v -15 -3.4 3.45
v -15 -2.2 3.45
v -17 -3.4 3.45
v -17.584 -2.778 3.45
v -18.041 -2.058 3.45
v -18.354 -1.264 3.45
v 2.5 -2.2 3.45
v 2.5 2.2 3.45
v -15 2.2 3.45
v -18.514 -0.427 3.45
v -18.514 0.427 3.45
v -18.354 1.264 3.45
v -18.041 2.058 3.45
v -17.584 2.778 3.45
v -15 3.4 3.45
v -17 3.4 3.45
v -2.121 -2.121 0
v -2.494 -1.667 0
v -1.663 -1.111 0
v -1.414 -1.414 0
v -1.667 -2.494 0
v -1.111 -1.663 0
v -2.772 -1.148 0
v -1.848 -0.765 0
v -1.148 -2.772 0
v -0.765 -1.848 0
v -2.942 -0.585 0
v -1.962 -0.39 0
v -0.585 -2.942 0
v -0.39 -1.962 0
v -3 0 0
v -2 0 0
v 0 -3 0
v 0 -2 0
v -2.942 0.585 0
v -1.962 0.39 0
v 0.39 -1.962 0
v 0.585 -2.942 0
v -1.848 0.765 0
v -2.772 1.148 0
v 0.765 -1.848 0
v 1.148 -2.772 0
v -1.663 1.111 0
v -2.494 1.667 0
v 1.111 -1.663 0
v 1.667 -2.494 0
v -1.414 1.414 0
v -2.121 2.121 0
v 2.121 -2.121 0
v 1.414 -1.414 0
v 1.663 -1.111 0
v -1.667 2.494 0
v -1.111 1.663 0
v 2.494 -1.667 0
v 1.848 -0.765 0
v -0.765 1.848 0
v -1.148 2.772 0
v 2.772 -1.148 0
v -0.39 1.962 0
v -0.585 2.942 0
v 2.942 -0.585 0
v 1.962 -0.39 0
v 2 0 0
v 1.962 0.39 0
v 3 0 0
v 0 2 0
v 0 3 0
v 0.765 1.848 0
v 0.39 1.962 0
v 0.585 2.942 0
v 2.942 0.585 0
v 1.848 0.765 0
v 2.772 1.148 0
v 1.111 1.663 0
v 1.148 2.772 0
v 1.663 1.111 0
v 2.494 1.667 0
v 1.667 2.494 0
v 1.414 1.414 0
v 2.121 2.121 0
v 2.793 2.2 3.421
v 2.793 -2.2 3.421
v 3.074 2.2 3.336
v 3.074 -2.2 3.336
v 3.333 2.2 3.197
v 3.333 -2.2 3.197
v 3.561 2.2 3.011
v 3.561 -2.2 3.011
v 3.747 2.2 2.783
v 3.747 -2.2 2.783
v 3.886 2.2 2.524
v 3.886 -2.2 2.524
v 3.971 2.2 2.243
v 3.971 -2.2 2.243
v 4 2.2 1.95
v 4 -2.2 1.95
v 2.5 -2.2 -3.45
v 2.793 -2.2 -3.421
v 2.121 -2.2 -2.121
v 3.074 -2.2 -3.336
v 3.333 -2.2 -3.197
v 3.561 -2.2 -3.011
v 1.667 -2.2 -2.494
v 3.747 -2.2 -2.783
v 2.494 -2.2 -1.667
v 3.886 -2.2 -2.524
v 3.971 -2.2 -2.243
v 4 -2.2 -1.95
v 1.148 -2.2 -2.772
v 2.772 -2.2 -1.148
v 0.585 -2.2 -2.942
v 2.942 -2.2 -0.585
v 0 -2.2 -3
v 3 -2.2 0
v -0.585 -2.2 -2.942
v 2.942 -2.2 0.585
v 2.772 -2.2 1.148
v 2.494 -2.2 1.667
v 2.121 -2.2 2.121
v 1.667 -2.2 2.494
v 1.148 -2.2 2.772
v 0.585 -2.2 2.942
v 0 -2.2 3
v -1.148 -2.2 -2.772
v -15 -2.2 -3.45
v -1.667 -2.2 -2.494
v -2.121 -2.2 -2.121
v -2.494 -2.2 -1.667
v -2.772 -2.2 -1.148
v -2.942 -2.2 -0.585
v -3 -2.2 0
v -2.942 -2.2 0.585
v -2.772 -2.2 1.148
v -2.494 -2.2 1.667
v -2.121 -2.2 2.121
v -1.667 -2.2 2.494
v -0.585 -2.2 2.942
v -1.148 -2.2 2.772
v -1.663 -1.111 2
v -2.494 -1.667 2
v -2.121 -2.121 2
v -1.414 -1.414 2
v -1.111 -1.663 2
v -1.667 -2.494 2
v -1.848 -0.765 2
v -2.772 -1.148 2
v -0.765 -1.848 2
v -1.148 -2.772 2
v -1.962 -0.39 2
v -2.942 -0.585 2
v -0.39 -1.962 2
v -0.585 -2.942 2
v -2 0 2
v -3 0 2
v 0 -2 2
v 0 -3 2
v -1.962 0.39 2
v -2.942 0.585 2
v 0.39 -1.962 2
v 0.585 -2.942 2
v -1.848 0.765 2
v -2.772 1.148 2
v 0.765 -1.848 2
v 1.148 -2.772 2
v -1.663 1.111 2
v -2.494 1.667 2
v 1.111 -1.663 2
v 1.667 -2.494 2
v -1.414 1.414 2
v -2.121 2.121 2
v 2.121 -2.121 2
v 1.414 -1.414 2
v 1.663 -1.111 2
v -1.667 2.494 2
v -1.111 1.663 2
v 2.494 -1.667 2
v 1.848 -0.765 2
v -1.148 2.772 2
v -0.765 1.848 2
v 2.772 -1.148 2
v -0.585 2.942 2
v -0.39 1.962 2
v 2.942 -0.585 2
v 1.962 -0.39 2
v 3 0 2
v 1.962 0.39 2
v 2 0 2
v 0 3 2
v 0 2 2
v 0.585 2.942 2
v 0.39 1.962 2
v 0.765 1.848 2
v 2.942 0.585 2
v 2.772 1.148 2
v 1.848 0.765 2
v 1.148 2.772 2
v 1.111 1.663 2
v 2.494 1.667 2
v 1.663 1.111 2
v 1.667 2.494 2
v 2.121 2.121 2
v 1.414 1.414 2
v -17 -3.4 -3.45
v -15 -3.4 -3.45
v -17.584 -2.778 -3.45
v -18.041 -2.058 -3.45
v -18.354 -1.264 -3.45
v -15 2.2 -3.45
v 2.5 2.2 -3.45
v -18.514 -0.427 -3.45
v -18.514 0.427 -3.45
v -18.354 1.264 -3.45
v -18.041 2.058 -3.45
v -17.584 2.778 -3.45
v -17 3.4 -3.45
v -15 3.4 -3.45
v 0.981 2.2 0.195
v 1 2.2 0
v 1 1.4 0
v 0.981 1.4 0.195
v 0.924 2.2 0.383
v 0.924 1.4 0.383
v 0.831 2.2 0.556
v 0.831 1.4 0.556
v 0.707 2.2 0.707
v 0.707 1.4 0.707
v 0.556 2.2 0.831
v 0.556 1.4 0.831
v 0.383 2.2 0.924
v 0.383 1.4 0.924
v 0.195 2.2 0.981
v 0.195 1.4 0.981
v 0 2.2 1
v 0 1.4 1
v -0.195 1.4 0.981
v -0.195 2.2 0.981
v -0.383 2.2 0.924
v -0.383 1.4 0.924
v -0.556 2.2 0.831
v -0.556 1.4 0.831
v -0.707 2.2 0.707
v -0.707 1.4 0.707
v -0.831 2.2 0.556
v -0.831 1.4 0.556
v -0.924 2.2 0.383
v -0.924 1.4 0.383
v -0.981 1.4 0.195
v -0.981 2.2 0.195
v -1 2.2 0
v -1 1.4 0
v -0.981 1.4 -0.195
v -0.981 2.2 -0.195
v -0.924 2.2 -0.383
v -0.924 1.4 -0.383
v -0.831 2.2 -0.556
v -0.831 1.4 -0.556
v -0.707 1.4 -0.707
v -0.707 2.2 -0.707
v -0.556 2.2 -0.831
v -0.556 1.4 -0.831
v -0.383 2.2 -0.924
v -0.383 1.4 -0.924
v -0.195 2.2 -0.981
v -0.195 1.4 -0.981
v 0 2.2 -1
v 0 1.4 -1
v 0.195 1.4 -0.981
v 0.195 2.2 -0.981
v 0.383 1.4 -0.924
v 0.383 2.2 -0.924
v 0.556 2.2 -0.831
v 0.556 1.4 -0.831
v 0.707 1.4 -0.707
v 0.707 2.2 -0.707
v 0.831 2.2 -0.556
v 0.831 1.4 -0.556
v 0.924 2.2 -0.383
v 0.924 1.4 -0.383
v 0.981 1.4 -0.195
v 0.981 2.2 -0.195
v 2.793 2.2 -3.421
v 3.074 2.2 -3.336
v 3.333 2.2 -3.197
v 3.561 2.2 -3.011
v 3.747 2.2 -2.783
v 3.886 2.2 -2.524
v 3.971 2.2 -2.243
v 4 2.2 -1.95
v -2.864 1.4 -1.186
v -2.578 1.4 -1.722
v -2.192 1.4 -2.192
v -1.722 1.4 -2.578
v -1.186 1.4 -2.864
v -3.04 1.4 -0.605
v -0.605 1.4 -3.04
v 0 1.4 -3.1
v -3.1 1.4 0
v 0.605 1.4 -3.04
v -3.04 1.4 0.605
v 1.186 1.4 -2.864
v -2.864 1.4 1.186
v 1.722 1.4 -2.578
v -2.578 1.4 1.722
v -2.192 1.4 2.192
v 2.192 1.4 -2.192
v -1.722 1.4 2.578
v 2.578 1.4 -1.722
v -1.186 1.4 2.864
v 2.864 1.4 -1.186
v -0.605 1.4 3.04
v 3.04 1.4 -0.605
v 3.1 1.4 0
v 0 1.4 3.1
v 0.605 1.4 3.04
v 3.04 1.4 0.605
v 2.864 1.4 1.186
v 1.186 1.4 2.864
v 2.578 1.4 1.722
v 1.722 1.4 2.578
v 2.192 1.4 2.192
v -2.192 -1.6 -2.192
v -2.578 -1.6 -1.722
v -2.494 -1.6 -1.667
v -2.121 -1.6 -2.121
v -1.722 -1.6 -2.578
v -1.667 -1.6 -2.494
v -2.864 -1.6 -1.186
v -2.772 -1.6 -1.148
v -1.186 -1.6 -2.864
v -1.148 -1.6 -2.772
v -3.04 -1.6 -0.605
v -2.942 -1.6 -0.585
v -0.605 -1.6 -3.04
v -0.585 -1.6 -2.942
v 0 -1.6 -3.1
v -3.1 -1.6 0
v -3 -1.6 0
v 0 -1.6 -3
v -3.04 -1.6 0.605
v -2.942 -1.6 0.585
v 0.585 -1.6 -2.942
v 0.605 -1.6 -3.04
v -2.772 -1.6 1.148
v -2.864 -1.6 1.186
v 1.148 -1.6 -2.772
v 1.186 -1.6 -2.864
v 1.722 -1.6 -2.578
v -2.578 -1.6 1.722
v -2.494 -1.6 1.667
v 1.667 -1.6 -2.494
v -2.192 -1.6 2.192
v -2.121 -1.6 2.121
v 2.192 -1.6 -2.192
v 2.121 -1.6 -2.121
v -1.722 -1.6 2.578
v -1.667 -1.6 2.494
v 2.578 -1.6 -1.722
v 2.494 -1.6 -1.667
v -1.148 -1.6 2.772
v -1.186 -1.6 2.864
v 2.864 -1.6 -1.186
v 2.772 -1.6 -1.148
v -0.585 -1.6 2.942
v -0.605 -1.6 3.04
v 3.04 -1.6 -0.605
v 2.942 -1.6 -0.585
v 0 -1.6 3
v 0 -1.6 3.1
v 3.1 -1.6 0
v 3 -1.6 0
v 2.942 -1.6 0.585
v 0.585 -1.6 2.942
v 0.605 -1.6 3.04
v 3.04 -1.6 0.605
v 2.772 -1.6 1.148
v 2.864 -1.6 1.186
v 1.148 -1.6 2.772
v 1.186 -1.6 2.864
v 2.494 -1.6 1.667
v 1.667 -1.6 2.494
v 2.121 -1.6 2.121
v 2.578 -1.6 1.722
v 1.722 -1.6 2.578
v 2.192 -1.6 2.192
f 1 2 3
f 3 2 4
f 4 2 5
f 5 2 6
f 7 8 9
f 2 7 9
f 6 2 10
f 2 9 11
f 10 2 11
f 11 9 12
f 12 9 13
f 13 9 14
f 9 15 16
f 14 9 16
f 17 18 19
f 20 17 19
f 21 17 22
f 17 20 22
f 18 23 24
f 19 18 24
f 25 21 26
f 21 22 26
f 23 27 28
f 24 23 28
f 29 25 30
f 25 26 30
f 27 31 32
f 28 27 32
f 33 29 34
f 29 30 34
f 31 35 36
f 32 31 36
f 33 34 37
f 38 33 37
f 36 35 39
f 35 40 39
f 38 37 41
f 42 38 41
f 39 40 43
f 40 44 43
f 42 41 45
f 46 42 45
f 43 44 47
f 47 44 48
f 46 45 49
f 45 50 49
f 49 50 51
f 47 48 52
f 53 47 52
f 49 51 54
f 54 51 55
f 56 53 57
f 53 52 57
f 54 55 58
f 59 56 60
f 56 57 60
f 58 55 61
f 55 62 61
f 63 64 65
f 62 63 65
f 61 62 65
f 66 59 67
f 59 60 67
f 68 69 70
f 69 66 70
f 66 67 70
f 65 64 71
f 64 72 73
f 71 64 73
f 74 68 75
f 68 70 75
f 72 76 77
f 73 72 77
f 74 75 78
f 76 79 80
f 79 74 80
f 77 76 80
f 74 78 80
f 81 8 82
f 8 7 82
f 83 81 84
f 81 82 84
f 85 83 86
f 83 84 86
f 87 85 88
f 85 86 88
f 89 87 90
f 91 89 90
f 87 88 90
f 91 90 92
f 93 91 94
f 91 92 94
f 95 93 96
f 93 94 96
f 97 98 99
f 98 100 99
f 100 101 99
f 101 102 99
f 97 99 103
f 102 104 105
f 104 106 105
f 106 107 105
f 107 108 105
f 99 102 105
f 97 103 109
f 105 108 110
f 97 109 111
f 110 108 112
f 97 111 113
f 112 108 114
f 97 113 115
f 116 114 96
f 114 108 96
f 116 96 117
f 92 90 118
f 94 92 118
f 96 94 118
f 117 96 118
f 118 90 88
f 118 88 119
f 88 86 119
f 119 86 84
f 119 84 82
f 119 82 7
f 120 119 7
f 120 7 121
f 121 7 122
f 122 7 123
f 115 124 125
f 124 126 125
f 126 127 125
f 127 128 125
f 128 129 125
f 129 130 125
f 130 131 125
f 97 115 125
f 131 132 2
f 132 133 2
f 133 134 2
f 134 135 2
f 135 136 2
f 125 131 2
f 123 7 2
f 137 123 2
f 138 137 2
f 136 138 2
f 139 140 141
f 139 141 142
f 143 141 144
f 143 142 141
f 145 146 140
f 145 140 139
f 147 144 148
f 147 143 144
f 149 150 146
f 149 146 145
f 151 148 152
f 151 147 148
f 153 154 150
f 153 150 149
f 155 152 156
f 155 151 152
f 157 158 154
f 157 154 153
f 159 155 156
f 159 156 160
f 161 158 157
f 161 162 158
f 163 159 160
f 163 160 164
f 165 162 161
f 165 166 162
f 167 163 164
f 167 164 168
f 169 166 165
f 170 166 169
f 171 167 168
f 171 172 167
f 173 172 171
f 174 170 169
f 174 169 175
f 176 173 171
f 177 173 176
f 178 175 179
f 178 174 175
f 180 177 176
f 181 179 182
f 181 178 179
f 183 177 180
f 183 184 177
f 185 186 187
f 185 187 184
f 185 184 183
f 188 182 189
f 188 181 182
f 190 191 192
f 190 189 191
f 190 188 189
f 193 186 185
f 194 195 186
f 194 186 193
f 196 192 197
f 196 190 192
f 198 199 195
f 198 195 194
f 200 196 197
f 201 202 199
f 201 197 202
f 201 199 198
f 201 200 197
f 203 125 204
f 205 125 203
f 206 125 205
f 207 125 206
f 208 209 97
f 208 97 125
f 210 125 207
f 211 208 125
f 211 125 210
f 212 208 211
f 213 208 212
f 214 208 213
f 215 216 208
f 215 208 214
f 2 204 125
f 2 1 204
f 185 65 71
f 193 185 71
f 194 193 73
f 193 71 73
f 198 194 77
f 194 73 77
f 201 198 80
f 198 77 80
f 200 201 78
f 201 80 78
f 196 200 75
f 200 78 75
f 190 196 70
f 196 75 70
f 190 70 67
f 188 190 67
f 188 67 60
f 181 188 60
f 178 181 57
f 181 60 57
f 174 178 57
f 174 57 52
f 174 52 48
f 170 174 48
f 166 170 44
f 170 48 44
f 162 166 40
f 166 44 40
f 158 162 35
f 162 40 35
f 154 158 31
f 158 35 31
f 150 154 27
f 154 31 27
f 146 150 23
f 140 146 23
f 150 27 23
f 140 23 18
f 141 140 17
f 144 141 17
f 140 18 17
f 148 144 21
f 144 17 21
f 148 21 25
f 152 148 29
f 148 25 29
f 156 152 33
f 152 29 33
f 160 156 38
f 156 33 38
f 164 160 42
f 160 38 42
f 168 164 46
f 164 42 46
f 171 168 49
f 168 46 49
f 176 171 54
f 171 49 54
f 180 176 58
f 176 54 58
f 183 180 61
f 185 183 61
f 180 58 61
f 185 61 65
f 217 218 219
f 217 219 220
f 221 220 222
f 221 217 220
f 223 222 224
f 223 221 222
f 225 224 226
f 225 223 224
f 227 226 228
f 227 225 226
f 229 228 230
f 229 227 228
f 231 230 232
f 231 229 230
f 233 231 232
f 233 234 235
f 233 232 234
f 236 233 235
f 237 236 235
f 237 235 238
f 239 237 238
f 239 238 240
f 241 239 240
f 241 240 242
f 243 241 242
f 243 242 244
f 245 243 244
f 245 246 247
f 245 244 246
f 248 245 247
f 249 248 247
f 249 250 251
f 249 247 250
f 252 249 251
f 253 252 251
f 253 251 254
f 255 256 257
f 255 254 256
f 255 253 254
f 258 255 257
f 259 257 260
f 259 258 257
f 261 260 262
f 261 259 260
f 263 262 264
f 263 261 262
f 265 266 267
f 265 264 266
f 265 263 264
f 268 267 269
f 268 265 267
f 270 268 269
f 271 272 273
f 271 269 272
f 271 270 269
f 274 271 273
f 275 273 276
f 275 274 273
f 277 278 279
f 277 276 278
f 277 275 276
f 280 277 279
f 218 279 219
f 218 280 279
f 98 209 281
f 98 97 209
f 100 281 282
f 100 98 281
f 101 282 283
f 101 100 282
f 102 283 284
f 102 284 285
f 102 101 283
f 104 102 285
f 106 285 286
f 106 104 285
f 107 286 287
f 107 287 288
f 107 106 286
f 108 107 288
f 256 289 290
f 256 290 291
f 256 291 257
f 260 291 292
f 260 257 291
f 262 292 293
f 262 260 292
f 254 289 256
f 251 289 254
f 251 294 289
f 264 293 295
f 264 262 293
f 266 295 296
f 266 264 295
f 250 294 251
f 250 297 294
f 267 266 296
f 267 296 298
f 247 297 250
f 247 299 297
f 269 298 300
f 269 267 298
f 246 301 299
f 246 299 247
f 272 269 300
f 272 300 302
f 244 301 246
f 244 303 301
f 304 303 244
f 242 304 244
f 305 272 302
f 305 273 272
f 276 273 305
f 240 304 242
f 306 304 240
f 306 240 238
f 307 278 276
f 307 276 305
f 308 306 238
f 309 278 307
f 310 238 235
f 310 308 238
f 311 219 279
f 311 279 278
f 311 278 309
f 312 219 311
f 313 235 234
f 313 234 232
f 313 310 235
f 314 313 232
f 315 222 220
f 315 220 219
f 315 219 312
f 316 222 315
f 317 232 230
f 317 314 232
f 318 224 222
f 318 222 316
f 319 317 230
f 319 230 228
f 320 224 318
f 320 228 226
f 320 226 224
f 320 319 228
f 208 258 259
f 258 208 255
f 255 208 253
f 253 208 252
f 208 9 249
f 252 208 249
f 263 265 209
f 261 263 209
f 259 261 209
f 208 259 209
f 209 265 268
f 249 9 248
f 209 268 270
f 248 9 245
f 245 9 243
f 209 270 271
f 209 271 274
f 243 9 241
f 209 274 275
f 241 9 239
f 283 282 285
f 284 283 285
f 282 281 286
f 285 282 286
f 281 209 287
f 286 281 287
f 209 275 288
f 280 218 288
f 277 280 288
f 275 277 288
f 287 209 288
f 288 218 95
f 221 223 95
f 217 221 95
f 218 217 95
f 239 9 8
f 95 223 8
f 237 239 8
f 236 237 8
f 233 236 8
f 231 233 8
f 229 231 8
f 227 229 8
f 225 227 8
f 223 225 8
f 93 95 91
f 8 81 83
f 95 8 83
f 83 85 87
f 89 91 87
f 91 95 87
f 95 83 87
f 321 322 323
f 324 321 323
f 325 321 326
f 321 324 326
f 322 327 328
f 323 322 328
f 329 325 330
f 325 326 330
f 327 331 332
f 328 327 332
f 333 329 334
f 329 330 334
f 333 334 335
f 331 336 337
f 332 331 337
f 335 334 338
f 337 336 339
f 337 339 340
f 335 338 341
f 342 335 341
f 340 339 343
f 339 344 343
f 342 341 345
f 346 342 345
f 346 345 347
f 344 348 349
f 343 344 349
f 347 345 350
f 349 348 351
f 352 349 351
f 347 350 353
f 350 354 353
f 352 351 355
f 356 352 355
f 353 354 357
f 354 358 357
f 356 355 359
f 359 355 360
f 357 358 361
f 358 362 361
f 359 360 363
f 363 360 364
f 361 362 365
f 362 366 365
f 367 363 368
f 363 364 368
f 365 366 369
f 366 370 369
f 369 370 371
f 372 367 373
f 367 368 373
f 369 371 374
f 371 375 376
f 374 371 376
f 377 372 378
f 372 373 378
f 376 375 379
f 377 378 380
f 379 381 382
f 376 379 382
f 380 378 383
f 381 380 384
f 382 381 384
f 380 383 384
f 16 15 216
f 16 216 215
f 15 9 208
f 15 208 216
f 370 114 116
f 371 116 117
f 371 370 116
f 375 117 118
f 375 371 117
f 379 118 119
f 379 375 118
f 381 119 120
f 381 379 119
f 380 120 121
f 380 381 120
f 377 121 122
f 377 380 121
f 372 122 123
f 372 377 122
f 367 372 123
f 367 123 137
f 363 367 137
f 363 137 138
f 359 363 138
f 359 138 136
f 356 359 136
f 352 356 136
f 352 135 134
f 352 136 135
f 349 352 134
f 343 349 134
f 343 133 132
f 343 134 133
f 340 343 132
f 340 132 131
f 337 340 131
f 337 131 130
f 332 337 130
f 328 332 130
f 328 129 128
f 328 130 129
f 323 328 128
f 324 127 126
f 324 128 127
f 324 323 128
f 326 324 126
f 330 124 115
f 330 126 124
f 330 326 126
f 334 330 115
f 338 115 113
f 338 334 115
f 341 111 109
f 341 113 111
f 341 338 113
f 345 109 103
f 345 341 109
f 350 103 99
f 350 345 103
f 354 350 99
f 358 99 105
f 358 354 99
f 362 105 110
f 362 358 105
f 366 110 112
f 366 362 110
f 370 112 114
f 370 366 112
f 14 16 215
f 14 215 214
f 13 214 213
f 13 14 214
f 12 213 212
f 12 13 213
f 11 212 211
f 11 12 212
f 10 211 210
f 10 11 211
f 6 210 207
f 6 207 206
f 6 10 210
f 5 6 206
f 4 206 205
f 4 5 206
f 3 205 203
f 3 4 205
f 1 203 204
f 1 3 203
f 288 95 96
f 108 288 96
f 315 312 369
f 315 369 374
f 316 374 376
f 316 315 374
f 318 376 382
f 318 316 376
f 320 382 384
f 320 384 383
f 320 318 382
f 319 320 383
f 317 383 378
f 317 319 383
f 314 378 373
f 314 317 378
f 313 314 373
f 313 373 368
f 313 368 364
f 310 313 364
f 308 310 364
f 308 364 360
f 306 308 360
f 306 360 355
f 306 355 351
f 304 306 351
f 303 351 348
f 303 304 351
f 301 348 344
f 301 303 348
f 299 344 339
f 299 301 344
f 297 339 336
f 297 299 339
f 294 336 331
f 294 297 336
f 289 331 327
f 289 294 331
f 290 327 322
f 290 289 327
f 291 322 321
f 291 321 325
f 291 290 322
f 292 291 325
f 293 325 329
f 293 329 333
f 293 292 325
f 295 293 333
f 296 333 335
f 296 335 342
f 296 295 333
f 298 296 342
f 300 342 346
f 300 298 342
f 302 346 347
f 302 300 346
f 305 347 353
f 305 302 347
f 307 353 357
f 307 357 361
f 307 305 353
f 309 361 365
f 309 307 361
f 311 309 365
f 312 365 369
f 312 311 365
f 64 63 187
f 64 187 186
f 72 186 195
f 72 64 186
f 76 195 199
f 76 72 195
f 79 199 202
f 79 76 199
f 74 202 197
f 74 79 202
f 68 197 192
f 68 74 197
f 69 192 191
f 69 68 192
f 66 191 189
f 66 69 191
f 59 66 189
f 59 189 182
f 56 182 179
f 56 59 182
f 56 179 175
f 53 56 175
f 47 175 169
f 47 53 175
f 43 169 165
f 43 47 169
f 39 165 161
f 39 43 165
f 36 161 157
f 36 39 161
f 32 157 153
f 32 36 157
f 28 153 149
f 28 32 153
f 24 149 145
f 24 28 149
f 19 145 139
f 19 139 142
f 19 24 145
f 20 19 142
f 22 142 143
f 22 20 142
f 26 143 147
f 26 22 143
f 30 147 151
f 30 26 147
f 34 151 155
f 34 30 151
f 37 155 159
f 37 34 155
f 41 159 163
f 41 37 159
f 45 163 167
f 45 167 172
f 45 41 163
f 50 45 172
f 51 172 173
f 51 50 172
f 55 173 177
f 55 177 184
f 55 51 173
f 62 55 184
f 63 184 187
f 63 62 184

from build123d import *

# Parameters (mm, degrees)
SKETCH002_R      = 3
SKETCH002_R_2    = 2
EXTRUDE002_DEPTH = 2
SKETCH001_R      = 3.1
EXTRUDE001_DEPTH = 3
SKETCH004_R      = 3
EXTRUDE004_DEPTH = 1
SKETCH003_R      = 1
EXTRUDE003_DEPTH = 10
EXTRUDE_DEPTH    = 3.45
FILLET_R         = 1.5


with BuildPart() as bague:
    # Sketch002 → Extrude002 (new body)
    with BuildSketch(Plane.XY):
        Circle(SKETCH002_R)
        Circle(SKETCH002_R_2, mode=Mode.SUBTRACT)
    extrude(amount=EXTRUDE002_DEPTH)


with BuildPart() as logementaimant:
    # Sketch001 → Extrude001 (new body)
    with BuildSketch(Plane.XZ):
        Circle(SKETCH001_R)
    extrude(amount=EXTRUDE001_DEPTH)


with BuildPart() as logementaimant_1:
    # Extrude001 placement: moved
    add(logementaimant.part.moved(Location((0, 0.4, 0))))


with BuildPart() as retientaimant:
    # Sketch004 → Extrude004 (new body)
    with BuildSketch(Plane.XZ):
        Circle(SKETCH004_R)
    extrude(amount=EXTRUDE004_DEPTH)


with BuildPart() as retientaimant_1:
    # Extrude004 placement: moved
    add(retientaimant.part.moved(Location((0, -2.6, 0))))


with BuildPart() as fusion:
    # Sketch003 → Extrude003 (new body)
    with BuildSketch(Plane.XZ):
        Circle(SKETCH003_R)
    extrude(amount=EXTRUDE003_DEPTH)


with BuildPart() as fusion_1:
    # Extrude003 placement: moved
    add(fusion.part.moved(Location((0, 3, 0))))

    # Fusion: union LogementAimant, RetientAimant
    add(logementaimant_1.part)
    add(retientaimant_1.part)


with BuildPart() as fusion_2:
    # Fusion placement: moved
    add(fusion_1.part.moved(Location((0, 1, 0))))


with BuildPart() as fillet_body:
    # Sketch → Extrude (new body, symmetric)
    with BuildSketch(Plane.XY):
        with BuildLine():
            Line((-15, 2.2), (4, 2.2))
            Line((4, 2.2), (4, -2.2))
            Line((4, -2.2), (-15, -2.2))
            Line((-15, -3.4), (-15, -2.2))
            Line((-17, -3.4), (-15, -3.4))
            ThreePointArc((-17, 3.4), (-18.534314, 0), (-17, -3.4))
            Line((-15, 3.4), (-17, 3.4))
            Line((-15, 2.2), (-15, 3.4))
        make_face()
    extrude(amount=EXTRUDE_DEPTH, both=True)

    # Cut: cut Fusion
    add(fusion_2.part, mode=Mode.SUBTRACT)

    # Fillet
    fillet_edges = [fillet_body.edges().sort_by_distance(p)[0] for p in [
        (4, 0, -3.45),
        (4, 0, 3.45),
    ]]
    fillet(fillet_edges, radius=FILLET_R)


solid = Compound([bague.part, fillet_body.part])
